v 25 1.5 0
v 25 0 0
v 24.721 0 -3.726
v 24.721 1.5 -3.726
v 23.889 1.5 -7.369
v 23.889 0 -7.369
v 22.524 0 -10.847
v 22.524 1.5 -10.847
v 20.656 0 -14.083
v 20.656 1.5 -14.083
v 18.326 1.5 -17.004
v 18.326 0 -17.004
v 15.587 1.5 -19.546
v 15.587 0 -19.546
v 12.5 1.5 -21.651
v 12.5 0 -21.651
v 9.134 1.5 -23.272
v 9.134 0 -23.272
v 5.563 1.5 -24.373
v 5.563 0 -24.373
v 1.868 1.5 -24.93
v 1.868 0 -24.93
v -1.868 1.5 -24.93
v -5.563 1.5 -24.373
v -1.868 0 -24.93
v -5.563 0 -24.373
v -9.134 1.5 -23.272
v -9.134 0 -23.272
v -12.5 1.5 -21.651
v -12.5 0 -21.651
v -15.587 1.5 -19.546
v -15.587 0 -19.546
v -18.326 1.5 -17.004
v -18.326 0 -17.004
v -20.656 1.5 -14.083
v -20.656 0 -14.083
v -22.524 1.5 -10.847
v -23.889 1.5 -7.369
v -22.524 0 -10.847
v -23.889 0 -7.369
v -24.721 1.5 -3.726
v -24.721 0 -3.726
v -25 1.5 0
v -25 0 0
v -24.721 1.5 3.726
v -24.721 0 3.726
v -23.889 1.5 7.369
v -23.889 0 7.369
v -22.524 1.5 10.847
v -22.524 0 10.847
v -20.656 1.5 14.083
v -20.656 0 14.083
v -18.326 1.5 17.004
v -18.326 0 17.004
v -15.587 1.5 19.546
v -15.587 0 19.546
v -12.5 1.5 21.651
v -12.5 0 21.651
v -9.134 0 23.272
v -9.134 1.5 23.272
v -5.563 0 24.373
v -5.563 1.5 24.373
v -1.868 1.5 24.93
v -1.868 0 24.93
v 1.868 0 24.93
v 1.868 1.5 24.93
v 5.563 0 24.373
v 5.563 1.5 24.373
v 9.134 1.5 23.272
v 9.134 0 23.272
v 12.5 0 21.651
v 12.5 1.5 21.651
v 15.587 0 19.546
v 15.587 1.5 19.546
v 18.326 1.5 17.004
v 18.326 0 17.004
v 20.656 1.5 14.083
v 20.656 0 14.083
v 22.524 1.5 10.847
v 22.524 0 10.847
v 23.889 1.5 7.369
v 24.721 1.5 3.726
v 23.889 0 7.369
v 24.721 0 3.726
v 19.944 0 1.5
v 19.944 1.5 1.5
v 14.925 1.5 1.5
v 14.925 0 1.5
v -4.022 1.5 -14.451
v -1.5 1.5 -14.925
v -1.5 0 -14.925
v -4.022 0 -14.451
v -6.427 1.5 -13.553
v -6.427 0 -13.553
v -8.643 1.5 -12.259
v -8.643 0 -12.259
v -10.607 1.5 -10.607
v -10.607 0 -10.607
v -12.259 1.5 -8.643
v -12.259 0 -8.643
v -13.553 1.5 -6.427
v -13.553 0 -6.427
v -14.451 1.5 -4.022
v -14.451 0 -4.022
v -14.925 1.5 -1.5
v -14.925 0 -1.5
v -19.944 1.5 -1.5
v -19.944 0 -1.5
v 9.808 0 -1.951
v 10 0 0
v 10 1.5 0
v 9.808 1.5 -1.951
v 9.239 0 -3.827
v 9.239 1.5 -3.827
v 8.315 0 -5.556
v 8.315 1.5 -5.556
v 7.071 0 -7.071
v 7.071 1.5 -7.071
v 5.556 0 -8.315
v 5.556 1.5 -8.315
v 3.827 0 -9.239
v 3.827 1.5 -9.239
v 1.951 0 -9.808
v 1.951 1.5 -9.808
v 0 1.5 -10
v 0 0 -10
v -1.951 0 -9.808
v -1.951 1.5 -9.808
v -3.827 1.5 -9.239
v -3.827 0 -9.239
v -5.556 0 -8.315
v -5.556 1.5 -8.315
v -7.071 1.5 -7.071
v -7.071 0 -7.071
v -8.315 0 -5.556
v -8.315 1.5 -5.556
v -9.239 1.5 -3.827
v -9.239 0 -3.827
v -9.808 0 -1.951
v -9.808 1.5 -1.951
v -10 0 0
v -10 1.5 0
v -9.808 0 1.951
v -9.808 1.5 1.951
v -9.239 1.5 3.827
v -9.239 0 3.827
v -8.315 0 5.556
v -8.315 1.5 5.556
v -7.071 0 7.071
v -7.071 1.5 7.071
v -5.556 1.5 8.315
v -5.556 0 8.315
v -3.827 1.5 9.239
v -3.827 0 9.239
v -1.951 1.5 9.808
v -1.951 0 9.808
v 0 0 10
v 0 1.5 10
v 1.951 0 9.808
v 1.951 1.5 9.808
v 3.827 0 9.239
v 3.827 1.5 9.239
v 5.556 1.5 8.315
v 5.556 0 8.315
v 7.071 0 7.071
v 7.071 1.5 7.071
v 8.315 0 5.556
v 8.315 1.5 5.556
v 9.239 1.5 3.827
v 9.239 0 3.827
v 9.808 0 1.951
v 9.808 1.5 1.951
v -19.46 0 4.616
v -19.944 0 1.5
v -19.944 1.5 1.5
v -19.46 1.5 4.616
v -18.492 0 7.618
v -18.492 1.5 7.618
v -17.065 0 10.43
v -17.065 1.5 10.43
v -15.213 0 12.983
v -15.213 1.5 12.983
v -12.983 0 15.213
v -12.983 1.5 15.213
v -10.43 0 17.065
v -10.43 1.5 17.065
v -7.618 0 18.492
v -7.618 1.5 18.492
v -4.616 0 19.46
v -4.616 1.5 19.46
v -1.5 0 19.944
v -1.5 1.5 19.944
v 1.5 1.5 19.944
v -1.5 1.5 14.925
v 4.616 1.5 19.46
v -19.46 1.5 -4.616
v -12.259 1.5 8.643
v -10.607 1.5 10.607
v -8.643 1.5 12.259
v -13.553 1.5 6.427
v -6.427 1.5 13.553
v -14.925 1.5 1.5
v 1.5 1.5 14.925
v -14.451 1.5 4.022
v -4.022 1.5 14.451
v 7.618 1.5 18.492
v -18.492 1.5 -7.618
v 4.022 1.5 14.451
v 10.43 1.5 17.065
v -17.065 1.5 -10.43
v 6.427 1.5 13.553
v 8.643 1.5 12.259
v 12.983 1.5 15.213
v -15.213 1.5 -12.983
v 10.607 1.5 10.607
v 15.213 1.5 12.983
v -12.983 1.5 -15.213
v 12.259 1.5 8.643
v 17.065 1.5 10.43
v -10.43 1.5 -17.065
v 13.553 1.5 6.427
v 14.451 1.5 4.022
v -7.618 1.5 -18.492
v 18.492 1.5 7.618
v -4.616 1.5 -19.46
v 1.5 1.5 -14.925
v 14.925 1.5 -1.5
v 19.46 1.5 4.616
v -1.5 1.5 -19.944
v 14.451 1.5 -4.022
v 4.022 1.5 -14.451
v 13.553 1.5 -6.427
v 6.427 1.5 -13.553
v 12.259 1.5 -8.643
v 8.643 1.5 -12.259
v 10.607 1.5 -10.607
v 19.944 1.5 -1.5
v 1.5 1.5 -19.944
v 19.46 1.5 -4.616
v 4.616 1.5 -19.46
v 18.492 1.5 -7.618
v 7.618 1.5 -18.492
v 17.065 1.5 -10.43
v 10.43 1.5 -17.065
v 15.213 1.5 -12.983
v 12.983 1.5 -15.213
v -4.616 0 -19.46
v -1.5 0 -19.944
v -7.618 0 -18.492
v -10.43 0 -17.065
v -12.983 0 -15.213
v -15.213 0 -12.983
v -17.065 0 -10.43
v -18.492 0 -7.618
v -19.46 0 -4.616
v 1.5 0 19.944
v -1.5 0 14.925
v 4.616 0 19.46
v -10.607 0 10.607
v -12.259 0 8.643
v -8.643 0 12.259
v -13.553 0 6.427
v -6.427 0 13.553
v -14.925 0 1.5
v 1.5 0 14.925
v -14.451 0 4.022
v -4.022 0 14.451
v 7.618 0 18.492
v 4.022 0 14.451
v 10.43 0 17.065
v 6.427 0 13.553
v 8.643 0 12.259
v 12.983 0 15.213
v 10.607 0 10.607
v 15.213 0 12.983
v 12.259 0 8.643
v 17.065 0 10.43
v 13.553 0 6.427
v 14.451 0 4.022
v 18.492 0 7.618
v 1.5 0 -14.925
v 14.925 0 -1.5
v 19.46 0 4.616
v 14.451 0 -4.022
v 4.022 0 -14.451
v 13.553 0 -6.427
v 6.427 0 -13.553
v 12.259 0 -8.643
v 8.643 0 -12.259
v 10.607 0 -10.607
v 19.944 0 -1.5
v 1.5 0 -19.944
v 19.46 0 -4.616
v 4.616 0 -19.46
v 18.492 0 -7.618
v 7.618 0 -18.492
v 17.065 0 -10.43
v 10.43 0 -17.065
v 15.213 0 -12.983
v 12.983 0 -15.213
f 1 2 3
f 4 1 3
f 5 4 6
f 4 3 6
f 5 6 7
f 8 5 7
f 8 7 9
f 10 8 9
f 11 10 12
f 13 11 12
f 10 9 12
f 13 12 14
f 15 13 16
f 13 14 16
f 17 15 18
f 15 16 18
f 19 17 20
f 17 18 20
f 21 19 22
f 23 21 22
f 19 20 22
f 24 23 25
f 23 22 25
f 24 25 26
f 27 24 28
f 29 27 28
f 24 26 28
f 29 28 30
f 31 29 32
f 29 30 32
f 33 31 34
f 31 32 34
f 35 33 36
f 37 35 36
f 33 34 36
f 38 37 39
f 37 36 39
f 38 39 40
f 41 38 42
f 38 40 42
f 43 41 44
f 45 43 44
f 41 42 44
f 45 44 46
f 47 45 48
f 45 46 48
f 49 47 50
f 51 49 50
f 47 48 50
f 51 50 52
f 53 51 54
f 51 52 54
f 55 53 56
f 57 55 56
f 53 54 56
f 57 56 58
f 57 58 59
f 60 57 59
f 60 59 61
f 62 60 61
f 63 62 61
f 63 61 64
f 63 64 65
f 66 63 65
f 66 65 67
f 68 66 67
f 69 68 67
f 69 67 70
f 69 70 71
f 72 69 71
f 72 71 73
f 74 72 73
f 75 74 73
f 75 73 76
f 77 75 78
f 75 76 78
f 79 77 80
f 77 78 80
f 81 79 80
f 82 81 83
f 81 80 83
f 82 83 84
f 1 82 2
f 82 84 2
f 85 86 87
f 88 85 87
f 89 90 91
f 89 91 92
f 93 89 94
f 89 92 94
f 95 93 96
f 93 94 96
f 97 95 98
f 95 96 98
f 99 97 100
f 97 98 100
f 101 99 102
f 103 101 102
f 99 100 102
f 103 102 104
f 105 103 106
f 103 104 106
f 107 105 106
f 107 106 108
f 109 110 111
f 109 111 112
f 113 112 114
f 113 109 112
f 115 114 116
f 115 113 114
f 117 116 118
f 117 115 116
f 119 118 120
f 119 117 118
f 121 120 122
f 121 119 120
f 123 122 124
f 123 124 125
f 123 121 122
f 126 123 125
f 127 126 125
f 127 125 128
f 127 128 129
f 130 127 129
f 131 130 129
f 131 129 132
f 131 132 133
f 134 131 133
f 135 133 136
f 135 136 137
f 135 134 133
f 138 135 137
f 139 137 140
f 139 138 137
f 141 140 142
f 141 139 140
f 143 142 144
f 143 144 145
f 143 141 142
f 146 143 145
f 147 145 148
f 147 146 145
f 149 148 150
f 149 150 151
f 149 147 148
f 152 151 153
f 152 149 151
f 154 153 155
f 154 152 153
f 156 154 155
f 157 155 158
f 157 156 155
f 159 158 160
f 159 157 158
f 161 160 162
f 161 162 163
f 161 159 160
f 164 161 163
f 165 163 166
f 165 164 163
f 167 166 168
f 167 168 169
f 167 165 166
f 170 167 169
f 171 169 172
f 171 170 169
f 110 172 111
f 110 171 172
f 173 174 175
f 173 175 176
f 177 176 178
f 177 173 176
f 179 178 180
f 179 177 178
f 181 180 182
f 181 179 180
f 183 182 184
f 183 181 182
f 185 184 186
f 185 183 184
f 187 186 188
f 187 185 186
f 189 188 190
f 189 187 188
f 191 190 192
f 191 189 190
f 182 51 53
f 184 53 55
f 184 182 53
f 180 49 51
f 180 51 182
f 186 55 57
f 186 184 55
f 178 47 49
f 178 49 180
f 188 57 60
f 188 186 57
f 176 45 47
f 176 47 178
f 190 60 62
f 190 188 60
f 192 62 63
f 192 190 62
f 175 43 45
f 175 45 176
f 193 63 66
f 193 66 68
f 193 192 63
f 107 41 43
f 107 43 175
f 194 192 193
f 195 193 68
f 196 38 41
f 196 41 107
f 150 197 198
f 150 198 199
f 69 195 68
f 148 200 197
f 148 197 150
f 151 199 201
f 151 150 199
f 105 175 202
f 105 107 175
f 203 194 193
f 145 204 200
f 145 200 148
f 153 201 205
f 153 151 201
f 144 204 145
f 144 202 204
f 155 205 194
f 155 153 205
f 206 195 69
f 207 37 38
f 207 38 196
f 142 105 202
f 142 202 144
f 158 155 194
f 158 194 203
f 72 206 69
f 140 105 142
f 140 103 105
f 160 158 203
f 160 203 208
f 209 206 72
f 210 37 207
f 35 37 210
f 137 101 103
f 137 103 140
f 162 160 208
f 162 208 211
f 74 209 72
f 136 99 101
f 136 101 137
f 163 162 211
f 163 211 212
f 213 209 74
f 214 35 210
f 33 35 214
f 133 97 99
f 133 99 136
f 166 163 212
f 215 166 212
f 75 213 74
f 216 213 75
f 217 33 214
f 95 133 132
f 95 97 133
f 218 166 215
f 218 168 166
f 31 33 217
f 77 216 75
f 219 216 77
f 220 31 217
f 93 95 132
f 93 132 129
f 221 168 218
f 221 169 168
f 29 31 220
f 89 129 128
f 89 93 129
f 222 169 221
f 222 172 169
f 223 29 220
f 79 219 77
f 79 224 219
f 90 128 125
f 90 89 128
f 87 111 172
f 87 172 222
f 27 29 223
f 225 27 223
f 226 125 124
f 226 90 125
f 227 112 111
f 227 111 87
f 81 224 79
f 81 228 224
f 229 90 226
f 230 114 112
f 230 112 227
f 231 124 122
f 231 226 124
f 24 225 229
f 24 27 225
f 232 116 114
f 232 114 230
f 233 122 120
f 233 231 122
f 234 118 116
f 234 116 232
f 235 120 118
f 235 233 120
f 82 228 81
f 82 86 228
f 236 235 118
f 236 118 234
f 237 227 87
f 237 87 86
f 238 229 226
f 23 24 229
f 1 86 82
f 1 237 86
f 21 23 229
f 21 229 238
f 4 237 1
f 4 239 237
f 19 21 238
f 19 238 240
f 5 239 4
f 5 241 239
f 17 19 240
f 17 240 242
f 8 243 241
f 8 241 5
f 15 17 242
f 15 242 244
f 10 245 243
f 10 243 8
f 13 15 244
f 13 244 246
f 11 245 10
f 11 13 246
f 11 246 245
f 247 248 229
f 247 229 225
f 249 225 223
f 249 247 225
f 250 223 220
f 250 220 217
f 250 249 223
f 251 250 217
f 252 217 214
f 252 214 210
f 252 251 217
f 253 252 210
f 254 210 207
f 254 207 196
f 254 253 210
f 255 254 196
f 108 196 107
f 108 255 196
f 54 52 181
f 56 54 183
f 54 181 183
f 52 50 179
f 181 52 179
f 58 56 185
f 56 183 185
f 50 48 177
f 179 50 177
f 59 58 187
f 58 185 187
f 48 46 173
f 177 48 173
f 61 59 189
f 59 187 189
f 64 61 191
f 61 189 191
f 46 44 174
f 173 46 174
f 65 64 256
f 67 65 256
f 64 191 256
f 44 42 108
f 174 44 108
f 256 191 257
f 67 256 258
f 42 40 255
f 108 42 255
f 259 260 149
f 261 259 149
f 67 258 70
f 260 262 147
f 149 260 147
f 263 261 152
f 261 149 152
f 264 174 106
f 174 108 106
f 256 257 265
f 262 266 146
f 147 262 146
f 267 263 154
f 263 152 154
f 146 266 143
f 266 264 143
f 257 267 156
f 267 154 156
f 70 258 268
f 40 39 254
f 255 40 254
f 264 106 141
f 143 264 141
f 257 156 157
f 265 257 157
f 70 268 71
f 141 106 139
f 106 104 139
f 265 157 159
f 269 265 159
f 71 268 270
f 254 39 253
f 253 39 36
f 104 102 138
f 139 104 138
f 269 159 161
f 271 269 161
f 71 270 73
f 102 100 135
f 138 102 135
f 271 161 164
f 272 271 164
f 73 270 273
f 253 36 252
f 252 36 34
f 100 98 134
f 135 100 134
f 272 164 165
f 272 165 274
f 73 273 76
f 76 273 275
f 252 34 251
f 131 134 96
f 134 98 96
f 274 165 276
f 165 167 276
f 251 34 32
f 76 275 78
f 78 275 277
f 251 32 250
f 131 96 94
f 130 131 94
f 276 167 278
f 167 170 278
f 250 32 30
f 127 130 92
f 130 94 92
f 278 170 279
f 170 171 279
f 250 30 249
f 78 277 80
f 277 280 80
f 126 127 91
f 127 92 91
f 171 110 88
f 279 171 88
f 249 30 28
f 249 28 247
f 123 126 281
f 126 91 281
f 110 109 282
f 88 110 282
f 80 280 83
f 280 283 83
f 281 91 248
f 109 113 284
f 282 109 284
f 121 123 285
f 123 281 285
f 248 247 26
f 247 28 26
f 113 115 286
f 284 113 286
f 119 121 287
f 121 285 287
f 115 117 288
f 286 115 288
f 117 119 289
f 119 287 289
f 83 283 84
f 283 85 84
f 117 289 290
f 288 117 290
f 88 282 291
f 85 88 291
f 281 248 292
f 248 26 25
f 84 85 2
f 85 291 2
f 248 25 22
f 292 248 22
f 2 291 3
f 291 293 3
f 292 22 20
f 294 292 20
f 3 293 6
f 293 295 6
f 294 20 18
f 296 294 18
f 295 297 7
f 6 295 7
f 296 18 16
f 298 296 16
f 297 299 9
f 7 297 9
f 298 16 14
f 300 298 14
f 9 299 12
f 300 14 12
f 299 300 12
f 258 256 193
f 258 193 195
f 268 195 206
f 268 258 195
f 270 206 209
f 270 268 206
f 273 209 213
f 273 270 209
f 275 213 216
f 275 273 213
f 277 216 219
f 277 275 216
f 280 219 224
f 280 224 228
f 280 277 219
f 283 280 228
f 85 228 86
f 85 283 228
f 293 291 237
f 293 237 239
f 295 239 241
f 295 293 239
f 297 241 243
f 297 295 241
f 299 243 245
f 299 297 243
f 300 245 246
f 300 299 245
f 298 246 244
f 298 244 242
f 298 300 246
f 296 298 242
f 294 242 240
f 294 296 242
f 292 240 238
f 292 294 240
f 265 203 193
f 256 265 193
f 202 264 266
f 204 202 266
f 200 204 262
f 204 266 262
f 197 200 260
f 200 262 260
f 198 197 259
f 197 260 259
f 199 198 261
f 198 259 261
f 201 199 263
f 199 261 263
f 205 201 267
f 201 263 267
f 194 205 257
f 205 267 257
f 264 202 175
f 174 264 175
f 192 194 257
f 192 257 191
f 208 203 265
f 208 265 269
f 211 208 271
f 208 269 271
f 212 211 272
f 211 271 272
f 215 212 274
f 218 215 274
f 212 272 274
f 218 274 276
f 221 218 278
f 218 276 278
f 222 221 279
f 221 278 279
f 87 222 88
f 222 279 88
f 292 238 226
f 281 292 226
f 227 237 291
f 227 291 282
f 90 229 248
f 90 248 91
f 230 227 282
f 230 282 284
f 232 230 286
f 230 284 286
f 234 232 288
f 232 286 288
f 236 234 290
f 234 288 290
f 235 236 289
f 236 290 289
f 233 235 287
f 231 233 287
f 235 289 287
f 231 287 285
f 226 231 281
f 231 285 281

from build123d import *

# Parameters (mm, degrees)
ESQUISSE1_R          = 25
ESQUISSE1_R_2        = 20
BOSS_EXTRU_3_DEPTH   = 1.5
ESQUISSE1_R_3        = 15
ESQUISSE1_R_4        = 10
BOSS_EXTRU_3_2_DEPTH = 1.5
ESQUISSE3_W          = 7
ESQUISSE3_H          = 3
ESQUISSE3_W_2        = 3
ESQUISSE3_H_2        = 7
BOSS_EXTRU_5_DEPTH   = 1.5


with BuildPart() as part:
    # Esquisse1 → Boss.-Extru.3 (new body)
    with BuildSketch(Plane(origin=(0, 0, 0), x_dir=(1, 0, 0), z_dir=(0, 1, 0))):
        Circle(ESQUISSE1_R)
        Circle(ESQUISSE1_R_2, mode=Mode.SUBTRACT)
    extrude(amount=BOSS_EXTRU_3_DEPTH)



with BuildPart() as body_2:
    # Esquisse1 → Boss.-Extru.3 2 (new body)
    with BuildSketch(Plane(origin=(0, 0, 0), x_dir=(1, 0, 0), z_dir=(0, 1, 0))):
        Circle(ESQUISSE1_R_3)
        Circle(ESQUISSE1_R_4, mode=Mode.SUBTRACT)
    extrude(amount=BOSS_EXTRU_3_2_DEPTH)


with BuildPart() as part_1:
    add(part.part)

    add(body_2.part)  # Boss.-Extru.5 merges body 2
    # Esquisse3 → Boss.-Extru.5 (add)
    with BuildSketch(Plane(origin=(0, 1.5, 0), x_dir=(-1, 0, 0), z_dir=(0, 1, 0))):
        with Locations((18.424811557, 0)):
            Rectangle(ESQUISSE3_W, ESQUISSE3_H)
        with Locations((0, -17.5)):
            Rectangle(ESQUISSE3_W_2, ESQUISSE3_H_2)
        with Locations((-17.5, 0)):
            Rectangle(ESQUISSE3_W, ESQUISSE3_H)
        with Locations((0, 17.5)):
            Rectangle(ESQUISSE3_W_2, ESQUISSE3_H_2)
    extrude(amount=-BOSS_EXTRU_5_DEPTH)


solid = part_1.part
